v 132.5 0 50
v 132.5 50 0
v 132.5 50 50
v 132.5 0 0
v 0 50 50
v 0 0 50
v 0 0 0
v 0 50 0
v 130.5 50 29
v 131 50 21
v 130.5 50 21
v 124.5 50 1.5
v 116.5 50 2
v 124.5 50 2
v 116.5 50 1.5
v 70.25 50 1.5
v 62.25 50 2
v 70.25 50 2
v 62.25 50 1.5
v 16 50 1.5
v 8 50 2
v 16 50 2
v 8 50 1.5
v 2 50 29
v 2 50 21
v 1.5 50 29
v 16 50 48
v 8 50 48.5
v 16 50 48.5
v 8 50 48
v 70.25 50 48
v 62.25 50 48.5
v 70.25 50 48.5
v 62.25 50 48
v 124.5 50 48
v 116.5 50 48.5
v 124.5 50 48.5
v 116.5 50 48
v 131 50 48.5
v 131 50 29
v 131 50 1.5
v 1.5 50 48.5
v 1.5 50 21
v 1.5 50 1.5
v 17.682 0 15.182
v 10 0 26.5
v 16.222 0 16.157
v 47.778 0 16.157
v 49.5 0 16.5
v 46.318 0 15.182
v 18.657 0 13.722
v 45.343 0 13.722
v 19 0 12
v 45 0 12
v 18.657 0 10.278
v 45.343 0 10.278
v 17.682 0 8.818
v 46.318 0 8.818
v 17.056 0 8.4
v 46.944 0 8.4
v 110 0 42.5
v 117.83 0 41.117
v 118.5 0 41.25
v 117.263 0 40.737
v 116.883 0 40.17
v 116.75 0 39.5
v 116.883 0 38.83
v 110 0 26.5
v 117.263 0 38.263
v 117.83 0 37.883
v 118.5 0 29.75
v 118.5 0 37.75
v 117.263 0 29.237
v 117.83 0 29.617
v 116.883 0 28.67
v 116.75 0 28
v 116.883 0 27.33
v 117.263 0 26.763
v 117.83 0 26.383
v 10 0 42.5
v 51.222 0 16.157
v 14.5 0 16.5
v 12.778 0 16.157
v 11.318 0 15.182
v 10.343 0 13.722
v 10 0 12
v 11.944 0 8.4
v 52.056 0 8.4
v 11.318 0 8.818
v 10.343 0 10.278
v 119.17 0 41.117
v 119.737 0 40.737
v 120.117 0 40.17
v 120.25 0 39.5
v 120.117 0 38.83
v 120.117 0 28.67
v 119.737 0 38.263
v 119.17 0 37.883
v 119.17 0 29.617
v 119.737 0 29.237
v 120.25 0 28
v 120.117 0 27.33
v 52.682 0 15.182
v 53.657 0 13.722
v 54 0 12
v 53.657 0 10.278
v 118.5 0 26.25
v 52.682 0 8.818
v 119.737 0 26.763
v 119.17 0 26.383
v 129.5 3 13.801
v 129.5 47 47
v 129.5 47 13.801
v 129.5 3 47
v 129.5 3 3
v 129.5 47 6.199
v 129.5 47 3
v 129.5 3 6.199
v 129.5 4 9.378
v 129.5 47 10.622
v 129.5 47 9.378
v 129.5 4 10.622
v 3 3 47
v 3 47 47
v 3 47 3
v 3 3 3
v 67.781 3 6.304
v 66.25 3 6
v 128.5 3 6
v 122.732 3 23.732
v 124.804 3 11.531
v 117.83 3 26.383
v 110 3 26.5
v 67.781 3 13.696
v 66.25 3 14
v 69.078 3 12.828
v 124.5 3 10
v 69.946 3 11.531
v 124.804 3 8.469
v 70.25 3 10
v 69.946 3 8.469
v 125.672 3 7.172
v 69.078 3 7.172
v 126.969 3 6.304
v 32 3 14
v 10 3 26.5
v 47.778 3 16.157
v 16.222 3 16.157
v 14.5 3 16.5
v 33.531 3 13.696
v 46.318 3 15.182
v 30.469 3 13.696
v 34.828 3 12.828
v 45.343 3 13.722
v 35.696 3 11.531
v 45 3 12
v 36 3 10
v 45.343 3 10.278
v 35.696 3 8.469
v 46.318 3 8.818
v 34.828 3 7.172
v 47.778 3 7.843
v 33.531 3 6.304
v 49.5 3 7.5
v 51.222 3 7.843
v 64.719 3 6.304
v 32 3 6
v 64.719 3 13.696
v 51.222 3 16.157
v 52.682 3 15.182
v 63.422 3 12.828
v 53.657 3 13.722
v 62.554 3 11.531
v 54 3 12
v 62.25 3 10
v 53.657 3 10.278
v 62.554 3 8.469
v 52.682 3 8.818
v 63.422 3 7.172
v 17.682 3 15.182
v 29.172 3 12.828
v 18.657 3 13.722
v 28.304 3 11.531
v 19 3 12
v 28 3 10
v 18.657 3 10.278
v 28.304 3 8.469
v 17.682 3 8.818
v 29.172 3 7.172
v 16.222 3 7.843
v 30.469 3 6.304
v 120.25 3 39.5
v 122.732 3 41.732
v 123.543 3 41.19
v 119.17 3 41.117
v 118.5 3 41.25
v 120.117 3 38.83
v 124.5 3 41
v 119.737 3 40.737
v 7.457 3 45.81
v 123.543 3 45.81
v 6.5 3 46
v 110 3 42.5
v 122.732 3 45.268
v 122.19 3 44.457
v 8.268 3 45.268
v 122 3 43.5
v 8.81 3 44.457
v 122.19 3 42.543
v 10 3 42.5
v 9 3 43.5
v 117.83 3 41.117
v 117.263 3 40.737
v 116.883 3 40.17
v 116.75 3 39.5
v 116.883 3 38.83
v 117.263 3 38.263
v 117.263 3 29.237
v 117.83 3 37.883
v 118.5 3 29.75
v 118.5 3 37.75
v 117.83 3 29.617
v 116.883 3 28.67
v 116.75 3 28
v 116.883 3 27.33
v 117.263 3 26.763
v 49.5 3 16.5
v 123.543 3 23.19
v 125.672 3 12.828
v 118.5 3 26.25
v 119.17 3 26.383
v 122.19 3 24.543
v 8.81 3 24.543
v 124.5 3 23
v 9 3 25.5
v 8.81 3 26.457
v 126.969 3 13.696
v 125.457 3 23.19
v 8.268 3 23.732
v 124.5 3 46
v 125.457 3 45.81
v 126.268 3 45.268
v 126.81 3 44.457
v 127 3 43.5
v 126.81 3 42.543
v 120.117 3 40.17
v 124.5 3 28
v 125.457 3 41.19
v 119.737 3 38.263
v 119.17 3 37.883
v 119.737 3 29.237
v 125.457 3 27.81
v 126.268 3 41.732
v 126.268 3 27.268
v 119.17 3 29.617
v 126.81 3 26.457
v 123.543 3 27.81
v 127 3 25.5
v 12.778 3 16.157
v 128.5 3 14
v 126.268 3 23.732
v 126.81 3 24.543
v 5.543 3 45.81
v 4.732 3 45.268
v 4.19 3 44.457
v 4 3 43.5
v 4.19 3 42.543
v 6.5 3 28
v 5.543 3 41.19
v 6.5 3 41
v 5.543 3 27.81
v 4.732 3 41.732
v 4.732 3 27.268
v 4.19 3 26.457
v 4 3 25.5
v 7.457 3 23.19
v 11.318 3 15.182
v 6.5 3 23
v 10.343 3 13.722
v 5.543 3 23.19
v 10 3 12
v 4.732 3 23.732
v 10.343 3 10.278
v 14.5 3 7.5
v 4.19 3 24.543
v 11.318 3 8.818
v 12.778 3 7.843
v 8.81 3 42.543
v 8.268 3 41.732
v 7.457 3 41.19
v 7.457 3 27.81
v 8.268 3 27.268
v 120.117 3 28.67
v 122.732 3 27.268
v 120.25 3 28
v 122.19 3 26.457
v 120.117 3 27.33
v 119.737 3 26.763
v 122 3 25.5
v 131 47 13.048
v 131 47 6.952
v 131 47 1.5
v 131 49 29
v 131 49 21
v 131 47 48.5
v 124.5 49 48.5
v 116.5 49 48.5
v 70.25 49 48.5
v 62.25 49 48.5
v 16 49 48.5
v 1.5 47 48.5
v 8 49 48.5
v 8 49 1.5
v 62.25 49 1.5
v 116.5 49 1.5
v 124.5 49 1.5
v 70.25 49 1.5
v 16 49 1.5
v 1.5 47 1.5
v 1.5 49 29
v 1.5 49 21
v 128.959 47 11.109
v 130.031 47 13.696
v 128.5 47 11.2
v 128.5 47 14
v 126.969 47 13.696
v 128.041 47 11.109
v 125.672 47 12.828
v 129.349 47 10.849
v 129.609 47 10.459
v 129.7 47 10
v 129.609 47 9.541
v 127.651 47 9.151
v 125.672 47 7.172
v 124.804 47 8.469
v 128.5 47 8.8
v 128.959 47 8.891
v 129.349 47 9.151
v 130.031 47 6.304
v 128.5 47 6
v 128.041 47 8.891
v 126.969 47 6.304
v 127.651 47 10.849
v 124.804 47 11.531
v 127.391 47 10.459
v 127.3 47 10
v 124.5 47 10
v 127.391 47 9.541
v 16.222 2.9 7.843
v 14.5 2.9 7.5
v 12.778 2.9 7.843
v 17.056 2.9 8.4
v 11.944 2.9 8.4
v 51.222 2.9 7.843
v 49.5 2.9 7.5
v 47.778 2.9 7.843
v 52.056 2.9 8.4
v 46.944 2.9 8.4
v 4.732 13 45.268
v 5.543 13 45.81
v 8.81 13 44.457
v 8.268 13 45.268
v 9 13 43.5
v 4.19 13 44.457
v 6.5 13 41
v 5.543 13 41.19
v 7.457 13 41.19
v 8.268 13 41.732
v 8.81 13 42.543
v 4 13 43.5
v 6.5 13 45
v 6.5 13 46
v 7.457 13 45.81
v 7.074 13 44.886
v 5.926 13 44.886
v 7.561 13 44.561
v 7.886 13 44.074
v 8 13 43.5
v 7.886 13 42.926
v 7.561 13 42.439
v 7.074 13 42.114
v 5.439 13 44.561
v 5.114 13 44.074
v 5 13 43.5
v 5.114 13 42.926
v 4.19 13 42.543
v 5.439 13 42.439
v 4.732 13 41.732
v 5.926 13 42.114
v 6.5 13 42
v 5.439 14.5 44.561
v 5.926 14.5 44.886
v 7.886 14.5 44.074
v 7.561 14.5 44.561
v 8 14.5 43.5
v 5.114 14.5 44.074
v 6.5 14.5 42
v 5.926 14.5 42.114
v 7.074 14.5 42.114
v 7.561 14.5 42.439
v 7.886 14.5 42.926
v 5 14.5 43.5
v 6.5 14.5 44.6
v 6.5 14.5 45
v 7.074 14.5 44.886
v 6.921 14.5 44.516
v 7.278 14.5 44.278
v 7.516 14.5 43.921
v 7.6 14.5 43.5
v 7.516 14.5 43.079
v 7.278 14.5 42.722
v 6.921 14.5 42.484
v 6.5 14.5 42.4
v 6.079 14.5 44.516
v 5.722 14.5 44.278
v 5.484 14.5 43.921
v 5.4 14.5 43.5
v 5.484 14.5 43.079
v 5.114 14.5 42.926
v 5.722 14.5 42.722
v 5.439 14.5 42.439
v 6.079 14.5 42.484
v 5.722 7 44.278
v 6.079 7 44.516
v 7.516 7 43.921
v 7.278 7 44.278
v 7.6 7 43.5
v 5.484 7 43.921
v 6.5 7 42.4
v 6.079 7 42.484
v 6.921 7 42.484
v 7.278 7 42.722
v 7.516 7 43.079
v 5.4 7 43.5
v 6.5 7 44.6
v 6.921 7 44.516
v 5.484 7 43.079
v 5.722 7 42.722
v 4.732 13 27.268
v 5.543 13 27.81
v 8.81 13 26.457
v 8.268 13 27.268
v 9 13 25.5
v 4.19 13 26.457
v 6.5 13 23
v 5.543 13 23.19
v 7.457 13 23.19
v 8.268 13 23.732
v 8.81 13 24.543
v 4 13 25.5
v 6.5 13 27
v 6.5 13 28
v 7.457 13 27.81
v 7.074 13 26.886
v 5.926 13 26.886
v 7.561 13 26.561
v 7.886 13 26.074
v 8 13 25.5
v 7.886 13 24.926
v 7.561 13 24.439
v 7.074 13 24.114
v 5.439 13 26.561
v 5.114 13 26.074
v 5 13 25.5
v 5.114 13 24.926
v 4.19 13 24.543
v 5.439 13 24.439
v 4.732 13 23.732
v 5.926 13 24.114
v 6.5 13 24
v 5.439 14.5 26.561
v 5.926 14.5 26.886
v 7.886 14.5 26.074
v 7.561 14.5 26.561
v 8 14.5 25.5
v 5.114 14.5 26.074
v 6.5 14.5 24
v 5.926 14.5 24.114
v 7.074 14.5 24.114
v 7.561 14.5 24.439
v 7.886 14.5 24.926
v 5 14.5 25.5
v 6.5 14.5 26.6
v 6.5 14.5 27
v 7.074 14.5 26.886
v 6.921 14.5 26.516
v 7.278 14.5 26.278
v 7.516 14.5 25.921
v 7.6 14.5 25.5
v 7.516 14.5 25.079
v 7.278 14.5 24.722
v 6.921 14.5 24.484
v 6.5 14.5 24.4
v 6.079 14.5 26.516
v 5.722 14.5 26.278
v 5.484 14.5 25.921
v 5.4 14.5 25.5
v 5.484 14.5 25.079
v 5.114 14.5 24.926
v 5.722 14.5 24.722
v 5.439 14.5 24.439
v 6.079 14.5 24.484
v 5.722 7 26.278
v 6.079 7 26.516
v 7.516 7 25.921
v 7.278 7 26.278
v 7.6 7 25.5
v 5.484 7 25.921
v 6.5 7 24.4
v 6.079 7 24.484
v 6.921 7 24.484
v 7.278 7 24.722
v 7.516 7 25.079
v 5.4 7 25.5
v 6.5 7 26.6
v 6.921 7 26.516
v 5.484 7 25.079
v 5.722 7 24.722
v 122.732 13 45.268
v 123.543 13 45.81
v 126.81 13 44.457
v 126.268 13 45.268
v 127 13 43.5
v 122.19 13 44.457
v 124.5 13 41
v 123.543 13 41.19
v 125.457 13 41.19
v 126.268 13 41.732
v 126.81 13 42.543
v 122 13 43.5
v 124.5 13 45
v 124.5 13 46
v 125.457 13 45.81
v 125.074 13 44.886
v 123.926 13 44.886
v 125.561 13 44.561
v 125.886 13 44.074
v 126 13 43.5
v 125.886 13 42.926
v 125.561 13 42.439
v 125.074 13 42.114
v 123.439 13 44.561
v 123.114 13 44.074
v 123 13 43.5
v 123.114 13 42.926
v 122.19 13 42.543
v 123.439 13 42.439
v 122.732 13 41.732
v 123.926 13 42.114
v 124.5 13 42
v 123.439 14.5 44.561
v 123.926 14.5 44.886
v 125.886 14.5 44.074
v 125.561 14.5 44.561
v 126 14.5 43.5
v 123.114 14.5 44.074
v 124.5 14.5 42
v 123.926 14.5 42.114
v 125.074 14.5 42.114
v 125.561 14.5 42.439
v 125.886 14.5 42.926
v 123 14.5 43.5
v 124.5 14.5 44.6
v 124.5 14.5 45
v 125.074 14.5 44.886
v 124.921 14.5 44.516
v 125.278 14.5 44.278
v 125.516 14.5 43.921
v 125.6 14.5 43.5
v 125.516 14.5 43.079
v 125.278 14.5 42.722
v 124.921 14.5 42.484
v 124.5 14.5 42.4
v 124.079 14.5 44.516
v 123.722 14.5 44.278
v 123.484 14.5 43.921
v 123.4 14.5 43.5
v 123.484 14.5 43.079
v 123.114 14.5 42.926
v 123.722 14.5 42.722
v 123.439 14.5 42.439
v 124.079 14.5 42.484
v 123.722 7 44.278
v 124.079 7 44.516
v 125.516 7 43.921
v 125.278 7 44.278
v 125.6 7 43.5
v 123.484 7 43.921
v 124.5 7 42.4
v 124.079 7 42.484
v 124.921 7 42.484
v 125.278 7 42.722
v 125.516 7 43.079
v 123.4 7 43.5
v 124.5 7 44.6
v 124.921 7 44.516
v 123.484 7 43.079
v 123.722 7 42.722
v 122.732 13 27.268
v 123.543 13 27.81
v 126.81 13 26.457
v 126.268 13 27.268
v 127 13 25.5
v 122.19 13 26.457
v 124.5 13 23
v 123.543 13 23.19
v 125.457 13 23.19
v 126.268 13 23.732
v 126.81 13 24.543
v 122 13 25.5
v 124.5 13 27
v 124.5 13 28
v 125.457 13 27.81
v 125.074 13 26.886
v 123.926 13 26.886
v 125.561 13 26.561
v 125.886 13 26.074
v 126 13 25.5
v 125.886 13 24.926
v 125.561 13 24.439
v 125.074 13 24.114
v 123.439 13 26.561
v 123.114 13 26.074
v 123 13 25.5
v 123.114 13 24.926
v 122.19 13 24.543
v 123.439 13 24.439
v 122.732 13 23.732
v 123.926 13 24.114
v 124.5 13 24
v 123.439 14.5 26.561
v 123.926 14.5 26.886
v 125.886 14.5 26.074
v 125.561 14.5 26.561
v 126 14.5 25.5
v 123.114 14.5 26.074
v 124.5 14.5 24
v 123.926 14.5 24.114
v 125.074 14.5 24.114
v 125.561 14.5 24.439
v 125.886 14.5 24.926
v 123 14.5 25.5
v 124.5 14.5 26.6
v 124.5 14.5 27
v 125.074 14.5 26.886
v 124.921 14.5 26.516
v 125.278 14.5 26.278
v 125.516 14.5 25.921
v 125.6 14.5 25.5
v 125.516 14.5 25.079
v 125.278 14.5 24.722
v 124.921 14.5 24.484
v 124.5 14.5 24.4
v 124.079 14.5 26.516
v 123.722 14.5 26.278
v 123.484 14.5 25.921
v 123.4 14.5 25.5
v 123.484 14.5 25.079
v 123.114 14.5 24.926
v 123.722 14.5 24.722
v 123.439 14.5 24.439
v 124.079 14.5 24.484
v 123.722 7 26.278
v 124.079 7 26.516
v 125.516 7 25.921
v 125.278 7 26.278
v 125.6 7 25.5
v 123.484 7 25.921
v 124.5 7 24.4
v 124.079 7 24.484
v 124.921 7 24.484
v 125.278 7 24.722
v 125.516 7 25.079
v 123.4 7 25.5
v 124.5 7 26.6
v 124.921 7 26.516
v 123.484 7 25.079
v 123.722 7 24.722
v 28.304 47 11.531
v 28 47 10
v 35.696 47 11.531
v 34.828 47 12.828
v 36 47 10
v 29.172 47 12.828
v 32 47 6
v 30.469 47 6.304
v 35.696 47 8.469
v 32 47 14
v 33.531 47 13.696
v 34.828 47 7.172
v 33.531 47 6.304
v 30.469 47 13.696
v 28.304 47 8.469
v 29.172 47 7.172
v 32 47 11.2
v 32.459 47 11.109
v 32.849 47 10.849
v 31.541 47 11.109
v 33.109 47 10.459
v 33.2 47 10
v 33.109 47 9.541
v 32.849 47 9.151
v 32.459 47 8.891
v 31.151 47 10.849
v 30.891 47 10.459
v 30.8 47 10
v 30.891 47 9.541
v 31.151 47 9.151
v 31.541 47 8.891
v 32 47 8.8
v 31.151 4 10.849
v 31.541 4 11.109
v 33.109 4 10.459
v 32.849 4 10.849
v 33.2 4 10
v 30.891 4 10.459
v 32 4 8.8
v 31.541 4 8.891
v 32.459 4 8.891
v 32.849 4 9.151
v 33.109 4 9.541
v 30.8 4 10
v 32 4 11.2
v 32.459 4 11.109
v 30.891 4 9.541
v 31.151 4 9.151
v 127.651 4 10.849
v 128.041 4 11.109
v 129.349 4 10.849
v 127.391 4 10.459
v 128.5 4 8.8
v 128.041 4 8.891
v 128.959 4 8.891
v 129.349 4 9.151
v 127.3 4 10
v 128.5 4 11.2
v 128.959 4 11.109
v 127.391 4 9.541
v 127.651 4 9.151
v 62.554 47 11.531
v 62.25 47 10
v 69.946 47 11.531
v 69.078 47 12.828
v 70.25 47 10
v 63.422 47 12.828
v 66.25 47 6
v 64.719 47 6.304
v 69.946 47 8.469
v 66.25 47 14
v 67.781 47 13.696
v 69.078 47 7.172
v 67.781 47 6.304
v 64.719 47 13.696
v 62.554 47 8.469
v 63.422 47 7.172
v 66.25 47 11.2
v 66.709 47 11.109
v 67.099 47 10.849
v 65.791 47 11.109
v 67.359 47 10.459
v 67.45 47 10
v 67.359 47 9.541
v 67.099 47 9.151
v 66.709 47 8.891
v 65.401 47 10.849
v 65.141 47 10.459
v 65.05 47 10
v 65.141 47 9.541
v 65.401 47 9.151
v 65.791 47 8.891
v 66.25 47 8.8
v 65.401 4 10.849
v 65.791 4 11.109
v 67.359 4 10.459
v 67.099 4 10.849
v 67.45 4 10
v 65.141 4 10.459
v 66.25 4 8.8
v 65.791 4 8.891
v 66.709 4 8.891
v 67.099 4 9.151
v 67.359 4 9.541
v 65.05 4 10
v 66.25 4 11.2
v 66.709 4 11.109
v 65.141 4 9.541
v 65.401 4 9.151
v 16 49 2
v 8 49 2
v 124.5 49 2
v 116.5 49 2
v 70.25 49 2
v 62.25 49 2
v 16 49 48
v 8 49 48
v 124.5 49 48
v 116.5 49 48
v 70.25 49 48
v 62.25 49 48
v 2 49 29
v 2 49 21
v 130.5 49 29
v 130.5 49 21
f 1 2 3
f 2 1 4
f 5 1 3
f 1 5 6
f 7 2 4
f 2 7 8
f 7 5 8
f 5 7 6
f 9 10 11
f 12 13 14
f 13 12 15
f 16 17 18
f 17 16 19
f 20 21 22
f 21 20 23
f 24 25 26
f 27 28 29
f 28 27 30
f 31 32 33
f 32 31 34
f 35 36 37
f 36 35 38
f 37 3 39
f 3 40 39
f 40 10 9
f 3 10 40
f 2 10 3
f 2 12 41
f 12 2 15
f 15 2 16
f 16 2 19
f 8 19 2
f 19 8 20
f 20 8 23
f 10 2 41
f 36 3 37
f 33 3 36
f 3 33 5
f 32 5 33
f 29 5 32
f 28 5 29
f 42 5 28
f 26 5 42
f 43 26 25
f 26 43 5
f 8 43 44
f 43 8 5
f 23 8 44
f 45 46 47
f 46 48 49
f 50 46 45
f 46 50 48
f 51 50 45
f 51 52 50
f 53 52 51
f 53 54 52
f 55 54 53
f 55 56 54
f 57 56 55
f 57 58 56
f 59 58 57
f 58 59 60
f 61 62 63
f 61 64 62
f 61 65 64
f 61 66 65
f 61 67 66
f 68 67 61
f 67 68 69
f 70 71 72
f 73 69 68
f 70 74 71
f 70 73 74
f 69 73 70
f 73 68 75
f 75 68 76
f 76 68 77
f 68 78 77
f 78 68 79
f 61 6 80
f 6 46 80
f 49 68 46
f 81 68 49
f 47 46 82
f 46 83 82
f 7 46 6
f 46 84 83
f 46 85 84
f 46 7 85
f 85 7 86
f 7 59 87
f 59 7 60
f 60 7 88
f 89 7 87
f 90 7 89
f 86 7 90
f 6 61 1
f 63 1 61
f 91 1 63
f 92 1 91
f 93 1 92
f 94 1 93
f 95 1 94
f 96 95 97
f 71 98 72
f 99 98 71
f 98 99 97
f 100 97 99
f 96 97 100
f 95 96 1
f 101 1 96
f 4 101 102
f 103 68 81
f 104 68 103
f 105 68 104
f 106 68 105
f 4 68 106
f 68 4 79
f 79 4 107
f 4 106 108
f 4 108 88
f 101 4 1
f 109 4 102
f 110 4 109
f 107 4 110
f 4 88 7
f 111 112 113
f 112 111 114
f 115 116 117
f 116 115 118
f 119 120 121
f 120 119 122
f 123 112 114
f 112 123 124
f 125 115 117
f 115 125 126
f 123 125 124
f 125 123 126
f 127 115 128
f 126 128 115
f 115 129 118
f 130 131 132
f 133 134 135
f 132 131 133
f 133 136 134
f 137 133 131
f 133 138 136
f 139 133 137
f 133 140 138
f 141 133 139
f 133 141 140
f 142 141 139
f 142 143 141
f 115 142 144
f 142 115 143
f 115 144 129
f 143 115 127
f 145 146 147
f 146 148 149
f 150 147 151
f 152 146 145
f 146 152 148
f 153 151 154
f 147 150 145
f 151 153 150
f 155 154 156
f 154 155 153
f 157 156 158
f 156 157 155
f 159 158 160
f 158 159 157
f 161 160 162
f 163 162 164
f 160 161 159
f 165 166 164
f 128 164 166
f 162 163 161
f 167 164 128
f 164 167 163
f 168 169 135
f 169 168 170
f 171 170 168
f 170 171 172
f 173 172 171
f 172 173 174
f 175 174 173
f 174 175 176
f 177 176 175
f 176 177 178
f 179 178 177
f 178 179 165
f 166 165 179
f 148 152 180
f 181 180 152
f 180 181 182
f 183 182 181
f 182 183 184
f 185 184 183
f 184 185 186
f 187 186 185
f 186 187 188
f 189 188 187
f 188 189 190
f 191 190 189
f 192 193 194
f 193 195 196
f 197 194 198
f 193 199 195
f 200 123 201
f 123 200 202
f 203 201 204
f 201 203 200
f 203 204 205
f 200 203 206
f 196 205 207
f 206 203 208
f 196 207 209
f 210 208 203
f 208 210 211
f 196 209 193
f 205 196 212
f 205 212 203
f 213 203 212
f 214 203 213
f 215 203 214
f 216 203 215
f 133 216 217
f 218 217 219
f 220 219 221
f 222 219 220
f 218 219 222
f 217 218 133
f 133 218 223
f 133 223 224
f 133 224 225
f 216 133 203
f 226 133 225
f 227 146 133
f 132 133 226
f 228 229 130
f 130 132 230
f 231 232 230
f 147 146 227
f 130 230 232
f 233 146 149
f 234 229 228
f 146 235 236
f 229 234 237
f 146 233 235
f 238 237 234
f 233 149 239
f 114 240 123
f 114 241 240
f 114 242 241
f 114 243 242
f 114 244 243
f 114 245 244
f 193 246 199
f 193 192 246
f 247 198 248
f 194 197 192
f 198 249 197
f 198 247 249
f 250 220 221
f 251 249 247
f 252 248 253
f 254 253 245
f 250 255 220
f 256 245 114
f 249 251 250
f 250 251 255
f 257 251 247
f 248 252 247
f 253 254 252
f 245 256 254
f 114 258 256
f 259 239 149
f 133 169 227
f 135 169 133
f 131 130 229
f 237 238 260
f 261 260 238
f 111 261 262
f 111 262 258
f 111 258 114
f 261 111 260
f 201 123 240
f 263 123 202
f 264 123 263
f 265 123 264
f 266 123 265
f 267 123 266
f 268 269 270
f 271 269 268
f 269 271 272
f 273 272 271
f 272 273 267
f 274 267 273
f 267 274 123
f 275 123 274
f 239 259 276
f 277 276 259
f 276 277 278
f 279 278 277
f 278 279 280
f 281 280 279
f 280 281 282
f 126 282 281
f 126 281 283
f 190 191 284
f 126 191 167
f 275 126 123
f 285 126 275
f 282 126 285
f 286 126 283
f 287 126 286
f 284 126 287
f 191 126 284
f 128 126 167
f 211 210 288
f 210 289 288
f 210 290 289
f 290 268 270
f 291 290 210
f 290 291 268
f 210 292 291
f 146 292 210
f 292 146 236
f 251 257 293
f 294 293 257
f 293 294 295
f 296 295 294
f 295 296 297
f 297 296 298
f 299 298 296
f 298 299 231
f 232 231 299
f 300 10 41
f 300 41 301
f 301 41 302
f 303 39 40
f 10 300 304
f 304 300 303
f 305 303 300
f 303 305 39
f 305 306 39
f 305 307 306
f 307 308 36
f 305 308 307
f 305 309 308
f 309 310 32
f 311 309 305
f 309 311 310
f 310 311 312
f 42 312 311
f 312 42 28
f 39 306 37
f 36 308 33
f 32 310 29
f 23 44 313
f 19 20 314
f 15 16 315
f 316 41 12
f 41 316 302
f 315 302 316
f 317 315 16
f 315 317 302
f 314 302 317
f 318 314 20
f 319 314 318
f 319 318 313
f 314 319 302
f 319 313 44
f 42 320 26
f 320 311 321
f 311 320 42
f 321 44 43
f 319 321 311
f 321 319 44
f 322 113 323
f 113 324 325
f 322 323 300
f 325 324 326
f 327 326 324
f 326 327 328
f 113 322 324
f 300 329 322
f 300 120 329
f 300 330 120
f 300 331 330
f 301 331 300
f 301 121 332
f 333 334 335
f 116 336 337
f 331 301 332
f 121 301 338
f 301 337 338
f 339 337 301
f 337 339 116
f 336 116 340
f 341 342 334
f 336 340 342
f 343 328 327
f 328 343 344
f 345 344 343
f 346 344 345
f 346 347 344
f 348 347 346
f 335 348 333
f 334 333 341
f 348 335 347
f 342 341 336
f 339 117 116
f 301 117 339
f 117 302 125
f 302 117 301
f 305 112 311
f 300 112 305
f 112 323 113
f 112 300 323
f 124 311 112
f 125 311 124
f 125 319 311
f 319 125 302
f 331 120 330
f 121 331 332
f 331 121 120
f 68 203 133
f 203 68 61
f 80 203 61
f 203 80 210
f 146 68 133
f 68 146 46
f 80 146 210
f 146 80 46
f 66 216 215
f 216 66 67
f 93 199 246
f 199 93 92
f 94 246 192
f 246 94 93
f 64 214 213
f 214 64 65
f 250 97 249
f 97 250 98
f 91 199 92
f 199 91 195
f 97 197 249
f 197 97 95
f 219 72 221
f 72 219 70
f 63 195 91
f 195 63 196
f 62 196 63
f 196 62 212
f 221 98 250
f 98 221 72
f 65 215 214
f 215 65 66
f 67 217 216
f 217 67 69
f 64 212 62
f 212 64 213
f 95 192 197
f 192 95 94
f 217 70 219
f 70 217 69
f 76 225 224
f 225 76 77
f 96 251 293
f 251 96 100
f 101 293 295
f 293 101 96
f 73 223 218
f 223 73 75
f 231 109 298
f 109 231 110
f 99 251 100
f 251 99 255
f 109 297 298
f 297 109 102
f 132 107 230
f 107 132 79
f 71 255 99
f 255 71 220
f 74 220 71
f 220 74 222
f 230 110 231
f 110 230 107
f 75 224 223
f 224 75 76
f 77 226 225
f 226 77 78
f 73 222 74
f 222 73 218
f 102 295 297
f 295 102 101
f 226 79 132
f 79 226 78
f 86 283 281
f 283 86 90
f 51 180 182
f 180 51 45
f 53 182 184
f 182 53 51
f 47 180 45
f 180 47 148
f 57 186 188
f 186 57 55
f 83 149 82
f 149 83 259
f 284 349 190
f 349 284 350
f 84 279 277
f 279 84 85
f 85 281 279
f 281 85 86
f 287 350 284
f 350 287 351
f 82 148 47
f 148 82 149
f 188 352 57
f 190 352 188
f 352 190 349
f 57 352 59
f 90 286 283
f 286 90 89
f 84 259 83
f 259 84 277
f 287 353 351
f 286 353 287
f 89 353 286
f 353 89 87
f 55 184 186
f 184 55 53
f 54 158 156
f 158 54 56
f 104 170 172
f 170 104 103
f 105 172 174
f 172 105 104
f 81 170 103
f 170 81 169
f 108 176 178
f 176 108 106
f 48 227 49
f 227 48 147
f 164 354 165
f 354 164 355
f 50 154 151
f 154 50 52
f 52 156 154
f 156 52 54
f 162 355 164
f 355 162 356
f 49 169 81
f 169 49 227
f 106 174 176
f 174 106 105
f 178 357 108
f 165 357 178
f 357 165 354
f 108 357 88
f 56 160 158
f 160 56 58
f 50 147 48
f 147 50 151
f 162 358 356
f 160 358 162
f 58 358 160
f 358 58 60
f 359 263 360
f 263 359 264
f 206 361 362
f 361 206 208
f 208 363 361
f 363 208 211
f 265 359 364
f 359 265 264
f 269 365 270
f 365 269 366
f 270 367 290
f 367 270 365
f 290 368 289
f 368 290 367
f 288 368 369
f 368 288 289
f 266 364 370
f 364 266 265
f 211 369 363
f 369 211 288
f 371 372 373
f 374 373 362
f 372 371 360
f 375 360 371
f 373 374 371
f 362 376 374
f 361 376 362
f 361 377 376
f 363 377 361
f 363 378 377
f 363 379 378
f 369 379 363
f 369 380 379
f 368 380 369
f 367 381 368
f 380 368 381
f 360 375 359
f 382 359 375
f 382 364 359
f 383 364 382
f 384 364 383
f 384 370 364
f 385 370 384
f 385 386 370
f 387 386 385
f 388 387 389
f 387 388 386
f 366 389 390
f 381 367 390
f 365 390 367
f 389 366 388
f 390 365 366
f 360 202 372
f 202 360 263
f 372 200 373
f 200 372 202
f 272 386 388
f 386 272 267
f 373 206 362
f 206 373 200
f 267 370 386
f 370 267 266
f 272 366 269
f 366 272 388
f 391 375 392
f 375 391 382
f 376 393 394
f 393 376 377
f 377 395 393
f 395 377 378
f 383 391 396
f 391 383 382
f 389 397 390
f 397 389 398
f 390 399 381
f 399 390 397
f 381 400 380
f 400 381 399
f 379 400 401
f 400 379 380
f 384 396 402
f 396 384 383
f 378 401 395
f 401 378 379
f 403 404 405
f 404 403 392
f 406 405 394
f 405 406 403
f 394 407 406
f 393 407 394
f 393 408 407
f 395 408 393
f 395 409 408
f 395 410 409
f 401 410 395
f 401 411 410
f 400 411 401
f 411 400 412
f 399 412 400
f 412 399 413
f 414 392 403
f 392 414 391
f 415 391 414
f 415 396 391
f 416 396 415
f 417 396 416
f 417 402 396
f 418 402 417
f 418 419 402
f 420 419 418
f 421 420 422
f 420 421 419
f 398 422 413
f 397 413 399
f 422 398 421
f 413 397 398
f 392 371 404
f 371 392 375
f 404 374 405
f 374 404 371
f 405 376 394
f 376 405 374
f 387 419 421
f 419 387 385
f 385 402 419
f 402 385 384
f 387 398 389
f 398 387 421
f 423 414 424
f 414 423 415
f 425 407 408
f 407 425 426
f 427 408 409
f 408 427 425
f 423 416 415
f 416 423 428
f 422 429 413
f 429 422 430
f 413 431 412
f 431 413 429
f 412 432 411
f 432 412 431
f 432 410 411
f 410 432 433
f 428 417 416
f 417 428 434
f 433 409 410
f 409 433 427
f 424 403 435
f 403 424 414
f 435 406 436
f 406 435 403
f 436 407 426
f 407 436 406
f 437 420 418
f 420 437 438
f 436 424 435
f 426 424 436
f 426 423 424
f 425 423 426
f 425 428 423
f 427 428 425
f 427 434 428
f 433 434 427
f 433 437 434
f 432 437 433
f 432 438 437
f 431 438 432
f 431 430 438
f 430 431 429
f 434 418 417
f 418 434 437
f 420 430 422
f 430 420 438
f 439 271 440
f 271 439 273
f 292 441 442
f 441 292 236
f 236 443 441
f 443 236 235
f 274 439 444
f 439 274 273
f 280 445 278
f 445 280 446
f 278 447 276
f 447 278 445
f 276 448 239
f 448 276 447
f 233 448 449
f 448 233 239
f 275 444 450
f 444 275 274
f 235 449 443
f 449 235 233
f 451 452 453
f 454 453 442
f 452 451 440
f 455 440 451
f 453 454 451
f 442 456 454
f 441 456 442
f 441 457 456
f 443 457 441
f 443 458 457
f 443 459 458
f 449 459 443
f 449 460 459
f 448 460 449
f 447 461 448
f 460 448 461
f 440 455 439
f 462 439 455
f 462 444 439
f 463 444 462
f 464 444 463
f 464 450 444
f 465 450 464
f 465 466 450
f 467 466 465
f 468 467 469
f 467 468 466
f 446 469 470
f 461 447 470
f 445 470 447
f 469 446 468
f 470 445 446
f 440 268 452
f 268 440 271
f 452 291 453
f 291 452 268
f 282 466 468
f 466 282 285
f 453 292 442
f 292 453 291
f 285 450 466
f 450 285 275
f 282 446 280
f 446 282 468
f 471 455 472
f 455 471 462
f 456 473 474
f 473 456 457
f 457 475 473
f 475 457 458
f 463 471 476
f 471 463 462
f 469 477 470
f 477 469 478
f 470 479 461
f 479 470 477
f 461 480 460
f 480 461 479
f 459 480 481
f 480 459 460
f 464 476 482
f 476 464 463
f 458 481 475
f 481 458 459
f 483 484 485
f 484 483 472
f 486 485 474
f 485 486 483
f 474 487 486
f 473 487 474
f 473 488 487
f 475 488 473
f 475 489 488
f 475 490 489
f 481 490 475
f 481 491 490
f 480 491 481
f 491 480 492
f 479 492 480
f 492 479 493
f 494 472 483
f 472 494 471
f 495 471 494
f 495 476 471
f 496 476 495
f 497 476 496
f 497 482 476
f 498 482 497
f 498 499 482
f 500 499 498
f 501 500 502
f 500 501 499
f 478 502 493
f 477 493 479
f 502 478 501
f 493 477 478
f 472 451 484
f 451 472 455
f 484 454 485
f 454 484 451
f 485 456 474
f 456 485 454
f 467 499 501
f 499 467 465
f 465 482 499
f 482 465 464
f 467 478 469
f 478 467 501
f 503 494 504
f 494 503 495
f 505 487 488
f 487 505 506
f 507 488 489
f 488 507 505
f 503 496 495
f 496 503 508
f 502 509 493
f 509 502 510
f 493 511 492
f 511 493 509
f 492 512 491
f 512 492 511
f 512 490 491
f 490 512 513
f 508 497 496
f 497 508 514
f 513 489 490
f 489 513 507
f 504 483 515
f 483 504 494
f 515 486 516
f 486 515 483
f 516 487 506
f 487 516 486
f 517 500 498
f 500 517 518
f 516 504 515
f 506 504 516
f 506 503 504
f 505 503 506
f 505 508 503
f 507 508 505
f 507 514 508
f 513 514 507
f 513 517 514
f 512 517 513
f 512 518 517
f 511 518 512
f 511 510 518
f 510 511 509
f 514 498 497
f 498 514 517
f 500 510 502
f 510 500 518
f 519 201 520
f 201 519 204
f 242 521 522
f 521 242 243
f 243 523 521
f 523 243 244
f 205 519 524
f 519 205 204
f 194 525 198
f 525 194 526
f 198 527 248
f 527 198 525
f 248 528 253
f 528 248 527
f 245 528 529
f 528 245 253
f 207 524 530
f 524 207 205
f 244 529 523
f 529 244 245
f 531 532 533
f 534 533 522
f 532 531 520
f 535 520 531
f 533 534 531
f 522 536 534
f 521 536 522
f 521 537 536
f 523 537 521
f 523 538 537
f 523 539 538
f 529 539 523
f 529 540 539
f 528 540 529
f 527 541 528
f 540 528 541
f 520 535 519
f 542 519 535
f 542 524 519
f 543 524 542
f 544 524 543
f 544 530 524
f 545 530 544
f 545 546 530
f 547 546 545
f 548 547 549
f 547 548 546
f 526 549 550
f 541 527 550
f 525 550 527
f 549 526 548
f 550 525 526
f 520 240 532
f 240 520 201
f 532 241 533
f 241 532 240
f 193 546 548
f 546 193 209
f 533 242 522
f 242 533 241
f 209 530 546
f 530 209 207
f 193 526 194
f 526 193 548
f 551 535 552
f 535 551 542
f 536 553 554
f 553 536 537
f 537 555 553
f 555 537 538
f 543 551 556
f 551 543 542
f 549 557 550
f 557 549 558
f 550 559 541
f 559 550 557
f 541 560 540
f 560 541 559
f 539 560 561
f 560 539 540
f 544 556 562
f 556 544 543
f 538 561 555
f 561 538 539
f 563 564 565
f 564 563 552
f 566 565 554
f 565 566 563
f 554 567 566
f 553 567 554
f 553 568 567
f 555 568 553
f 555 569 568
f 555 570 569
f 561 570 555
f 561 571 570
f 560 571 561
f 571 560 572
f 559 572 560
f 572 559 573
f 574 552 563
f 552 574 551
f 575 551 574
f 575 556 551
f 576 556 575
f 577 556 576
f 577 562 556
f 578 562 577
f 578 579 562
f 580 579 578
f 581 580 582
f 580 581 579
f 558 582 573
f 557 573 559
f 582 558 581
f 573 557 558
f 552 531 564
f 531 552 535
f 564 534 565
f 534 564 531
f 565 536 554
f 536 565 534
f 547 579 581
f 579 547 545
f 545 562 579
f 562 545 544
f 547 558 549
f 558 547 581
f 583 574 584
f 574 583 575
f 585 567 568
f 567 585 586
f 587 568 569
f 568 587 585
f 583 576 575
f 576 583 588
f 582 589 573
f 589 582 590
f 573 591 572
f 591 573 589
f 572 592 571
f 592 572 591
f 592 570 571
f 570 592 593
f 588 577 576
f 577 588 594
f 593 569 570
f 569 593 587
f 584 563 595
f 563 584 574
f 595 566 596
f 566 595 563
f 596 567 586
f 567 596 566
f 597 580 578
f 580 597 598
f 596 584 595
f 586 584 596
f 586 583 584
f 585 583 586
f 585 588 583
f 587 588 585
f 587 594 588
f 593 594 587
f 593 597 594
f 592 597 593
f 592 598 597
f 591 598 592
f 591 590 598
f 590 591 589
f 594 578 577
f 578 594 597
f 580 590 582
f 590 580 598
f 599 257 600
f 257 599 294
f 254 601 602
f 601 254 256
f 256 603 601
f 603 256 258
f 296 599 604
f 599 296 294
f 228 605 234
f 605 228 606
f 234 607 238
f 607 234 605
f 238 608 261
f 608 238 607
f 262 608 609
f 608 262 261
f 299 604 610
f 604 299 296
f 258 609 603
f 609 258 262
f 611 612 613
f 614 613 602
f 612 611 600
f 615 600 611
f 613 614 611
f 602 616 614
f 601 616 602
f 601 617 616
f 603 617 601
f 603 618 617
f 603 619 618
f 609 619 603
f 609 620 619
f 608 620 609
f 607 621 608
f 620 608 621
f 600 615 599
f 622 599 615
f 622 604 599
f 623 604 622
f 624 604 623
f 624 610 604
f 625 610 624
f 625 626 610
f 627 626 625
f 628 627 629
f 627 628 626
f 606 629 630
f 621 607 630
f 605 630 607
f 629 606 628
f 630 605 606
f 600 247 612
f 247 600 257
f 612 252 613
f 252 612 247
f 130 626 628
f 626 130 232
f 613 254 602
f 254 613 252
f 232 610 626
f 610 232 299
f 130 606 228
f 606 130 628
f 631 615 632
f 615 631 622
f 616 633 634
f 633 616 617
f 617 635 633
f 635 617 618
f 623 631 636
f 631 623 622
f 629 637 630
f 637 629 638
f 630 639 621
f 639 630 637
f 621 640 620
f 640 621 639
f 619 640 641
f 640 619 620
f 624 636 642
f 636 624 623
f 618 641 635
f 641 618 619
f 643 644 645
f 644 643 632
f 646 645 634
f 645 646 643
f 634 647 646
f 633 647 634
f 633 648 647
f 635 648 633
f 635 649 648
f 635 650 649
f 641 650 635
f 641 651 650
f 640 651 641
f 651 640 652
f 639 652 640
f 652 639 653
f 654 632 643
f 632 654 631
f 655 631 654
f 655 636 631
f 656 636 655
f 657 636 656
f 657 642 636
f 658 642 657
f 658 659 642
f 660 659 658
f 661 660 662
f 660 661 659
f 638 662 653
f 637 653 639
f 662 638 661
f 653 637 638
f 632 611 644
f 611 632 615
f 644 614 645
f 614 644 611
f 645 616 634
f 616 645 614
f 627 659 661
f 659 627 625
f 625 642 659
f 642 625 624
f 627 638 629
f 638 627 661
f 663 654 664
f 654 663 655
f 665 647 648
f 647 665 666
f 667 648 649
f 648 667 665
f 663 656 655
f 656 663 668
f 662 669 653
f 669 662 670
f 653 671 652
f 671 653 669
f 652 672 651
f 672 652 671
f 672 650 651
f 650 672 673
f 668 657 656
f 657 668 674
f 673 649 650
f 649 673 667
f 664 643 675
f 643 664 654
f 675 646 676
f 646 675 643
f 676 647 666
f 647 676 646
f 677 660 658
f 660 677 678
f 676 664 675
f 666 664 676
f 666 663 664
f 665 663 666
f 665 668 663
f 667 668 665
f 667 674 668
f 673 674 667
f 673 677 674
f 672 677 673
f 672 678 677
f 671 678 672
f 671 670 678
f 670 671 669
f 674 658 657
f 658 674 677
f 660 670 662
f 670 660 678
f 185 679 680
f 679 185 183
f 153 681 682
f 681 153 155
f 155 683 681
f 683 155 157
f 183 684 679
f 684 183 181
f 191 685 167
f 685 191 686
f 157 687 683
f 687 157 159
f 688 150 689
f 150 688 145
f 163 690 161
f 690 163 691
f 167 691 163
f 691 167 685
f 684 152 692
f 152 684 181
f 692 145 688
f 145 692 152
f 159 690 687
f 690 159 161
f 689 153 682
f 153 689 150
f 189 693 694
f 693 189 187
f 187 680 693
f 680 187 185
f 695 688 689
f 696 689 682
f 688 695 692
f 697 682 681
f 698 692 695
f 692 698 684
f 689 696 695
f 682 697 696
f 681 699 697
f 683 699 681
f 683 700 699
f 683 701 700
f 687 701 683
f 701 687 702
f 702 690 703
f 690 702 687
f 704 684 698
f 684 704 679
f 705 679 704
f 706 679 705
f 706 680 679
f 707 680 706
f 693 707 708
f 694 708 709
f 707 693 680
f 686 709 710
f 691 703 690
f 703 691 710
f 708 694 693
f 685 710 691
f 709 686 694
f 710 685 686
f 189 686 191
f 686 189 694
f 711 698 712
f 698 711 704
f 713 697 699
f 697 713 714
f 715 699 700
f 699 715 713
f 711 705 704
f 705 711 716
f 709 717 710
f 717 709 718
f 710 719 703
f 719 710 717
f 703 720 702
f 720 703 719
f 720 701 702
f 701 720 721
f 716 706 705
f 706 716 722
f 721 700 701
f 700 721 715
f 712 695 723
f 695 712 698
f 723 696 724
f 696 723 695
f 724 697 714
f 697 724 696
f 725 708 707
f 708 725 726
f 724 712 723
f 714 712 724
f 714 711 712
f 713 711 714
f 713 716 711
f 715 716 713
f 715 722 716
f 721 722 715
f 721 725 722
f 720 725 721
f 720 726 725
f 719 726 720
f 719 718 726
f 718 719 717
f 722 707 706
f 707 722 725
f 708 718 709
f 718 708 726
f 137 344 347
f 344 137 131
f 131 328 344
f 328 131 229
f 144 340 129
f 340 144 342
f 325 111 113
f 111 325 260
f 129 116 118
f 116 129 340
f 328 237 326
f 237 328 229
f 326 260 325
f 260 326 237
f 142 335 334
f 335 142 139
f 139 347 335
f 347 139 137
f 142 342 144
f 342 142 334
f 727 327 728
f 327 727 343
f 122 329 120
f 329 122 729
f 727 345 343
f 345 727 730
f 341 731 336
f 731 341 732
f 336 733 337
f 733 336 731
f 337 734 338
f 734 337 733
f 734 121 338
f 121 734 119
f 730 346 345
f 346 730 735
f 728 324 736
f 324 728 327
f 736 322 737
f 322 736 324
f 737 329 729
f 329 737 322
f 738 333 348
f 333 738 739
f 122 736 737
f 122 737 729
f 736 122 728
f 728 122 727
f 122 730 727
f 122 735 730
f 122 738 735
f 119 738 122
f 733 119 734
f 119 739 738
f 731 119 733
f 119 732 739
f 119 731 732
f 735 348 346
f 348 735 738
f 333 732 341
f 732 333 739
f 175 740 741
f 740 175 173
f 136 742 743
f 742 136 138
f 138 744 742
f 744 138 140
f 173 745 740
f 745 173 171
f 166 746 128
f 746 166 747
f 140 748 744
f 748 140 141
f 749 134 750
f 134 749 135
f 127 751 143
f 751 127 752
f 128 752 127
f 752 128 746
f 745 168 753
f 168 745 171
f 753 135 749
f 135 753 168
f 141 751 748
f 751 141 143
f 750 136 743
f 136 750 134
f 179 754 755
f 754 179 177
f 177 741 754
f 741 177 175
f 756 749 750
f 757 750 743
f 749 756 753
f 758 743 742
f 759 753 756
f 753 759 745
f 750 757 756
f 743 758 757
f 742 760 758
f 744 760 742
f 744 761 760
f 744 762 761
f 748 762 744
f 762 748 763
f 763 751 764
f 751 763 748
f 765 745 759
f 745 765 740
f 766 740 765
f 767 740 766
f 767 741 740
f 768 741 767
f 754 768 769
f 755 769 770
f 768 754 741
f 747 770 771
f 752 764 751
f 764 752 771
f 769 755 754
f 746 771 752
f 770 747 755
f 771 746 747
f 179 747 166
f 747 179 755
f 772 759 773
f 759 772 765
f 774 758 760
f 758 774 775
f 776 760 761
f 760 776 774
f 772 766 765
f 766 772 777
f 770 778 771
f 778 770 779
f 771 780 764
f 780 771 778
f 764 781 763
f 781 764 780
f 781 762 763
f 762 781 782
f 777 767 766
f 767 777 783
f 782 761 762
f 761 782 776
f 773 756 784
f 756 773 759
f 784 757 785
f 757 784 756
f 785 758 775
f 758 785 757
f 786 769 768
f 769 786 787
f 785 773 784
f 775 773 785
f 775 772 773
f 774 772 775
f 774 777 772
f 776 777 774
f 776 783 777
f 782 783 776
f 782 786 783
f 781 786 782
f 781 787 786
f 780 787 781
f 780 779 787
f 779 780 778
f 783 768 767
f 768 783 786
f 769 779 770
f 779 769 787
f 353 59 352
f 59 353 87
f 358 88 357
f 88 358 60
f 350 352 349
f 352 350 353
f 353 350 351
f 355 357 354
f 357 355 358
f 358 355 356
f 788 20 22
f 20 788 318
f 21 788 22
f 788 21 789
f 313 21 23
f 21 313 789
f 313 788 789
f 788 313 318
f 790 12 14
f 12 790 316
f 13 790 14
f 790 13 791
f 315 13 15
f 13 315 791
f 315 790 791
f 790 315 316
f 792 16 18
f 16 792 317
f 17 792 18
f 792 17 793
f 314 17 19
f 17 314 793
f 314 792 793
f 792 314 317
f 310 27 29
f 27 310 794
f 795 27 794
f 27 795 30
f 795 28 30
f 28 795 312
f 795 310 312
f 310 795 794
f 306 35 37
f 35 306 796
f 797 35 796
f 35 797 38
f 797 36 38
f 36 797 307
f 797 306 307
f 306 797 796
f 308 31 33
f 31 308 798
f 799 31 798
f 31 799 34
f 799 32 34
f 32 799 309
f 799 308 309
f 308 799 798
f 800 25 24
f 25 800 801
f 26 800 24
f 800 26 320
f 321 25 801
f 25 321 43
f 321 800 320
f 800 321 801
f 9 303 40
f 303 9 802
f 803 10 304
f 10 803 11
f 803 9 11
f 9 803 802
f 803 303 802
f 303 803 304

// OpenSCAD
$fn= 16;

module stud(){
    difference() {
        union() {
            cylinder(r=2.5, h=10, center=true);
            cylinder(r=1.5, h=13, center=true);
        };
        translate ([0,0,-3])cylinder(r=1.1, h=8, center=true);
    }
};

module stud2(){
    difference() {
        union() {
            cylinder(r=4, h=46, center=true);
        };
        translate ([0,0,-3])cylinder(r=1.2, h=46, center=true);
    }
};

module case_top() {
    difference() {
        cube([132.5, 50, 50]);
        translate([3, 3, 3]) cube([126.5, 60, 44]);
        translate([1.5, 47, 1.5]) cube([129.5, 60, 47]);

        translate([10, -10, 34 - 7.5])cube([100, 70, 16]);
        translate([0,-7, 52.5])    rotate([270, 0, 0])polyhedron([
            [0, 0, 0], [120, 0, 0], [120, 36, 0], [0, 36, 0],
            [10, 10, 10], [110, 10, 10], [110, 26, 10], [10, 26, 10],
        ],[
            [0,1,2,3], [4,5,1,0], [7,6,5,4], [5,6,2,1], [7,4,0,3]
        ]);
        translate([118.5, -2, 50 - 10.5])rotate([90, 0, 0])cylinder(r=1.75, h=15, center=true);
        translate([118.5, -2, 50 - 22])rotate([90, 0, 0])cylinder(r=1.75, h=15, center=true);

        translate([14.5, -2, 12])rotate([90, 0, 0])cylinder(r=4.5, h=15, center=true);
        translate([14.5 + 35, -2, 12])rotate([90, 0, 0])cylinder(r=4.5, h=15, center=true);
    };

    cube([132.5, 2.9, 8.4]);
    
    translate([6.5, 8, 50 - 6.5]) rotate([90, 0, 0]) stud();
    translate([6.5, 8, 50 - 24.5]) rotate([90, 0, 0]) stud();
    translate([124.5, 8, 50 - 6.5]) rotate([90, 0, 0]) stud();
    translate([124.5, 8, 50 - 24.5]) rotate([90, 0, 0]) stud();

    translate([32, 24, 10]) rotate([90, 0, 0]) stud2();
    translate([128.5, 24, 10]) rotate([90, 0, 0]) stud2();
    translate([66.25, 24, 10]) rotate([90, 0, 0]) stud2();

    translate([8,49,0]) cube([8, 1, 2]);
    translate([116.5,49,0]) cube([8, 1, 2]);
    translate([62.25,49,0]) cube([8, 1, 2]);

    translate([8,49,48]) cube([8, 1, 2]);
    translate([116.5,49,48]) cube([8, 1, 2]);
    translate([62.25,49,48]) cube([8, 1, 2]);

    translate([0,49,21]) cube([2, 1, 8]);
    translate([130.5,49,21]) cube([2, 1, 8]);
};


module case_bottom() {
   translate([1.6,47,1.6]) union() {
        difference() {
           cube([129.3, 3, 46.8]);
           translate([5.5,1.8,-1]) cube([10, 2, 2]);
           translate([129.3 -15.5,1.8,-1]) cube([10, 2, 2]);
           translate([59.65,1.8,-1]) cube([10, 2, 2]);

           translate([5.5,1.8,45.8]) cube([10, 2, 2]);
           translate([129.3 - 15.5,1.8,45.8]) cube([10, 2, 2]);
           translate([59.65,1.8,45.8]) cube([10, 2, 2]);

           translate([-1,1.8,18.4]) cube([2, 2, 10]);
           translate([128.3,1.8,18.4]) cube([2, 2, 10]);
           translate([89,-15,3]) cube([22, 20, 15]);


        };
        translate([100, -20.8,10]) rotate([270,0,0])
            import("StandardFemaleSingleMount.stl", convexity=3);
   };
};


module buttons() {
    difference() {
        union() {
            cylinder(r=1.5, h=10, center=true);
            translate([0,0, -3]) cylinder(r=2.5, h=4, center=true);
        };
        translate([0, 0, -4]) cylinder(r=1.7, h=4, center=true);
    };

}

// buttons();
case_top();
// case_bottom();
